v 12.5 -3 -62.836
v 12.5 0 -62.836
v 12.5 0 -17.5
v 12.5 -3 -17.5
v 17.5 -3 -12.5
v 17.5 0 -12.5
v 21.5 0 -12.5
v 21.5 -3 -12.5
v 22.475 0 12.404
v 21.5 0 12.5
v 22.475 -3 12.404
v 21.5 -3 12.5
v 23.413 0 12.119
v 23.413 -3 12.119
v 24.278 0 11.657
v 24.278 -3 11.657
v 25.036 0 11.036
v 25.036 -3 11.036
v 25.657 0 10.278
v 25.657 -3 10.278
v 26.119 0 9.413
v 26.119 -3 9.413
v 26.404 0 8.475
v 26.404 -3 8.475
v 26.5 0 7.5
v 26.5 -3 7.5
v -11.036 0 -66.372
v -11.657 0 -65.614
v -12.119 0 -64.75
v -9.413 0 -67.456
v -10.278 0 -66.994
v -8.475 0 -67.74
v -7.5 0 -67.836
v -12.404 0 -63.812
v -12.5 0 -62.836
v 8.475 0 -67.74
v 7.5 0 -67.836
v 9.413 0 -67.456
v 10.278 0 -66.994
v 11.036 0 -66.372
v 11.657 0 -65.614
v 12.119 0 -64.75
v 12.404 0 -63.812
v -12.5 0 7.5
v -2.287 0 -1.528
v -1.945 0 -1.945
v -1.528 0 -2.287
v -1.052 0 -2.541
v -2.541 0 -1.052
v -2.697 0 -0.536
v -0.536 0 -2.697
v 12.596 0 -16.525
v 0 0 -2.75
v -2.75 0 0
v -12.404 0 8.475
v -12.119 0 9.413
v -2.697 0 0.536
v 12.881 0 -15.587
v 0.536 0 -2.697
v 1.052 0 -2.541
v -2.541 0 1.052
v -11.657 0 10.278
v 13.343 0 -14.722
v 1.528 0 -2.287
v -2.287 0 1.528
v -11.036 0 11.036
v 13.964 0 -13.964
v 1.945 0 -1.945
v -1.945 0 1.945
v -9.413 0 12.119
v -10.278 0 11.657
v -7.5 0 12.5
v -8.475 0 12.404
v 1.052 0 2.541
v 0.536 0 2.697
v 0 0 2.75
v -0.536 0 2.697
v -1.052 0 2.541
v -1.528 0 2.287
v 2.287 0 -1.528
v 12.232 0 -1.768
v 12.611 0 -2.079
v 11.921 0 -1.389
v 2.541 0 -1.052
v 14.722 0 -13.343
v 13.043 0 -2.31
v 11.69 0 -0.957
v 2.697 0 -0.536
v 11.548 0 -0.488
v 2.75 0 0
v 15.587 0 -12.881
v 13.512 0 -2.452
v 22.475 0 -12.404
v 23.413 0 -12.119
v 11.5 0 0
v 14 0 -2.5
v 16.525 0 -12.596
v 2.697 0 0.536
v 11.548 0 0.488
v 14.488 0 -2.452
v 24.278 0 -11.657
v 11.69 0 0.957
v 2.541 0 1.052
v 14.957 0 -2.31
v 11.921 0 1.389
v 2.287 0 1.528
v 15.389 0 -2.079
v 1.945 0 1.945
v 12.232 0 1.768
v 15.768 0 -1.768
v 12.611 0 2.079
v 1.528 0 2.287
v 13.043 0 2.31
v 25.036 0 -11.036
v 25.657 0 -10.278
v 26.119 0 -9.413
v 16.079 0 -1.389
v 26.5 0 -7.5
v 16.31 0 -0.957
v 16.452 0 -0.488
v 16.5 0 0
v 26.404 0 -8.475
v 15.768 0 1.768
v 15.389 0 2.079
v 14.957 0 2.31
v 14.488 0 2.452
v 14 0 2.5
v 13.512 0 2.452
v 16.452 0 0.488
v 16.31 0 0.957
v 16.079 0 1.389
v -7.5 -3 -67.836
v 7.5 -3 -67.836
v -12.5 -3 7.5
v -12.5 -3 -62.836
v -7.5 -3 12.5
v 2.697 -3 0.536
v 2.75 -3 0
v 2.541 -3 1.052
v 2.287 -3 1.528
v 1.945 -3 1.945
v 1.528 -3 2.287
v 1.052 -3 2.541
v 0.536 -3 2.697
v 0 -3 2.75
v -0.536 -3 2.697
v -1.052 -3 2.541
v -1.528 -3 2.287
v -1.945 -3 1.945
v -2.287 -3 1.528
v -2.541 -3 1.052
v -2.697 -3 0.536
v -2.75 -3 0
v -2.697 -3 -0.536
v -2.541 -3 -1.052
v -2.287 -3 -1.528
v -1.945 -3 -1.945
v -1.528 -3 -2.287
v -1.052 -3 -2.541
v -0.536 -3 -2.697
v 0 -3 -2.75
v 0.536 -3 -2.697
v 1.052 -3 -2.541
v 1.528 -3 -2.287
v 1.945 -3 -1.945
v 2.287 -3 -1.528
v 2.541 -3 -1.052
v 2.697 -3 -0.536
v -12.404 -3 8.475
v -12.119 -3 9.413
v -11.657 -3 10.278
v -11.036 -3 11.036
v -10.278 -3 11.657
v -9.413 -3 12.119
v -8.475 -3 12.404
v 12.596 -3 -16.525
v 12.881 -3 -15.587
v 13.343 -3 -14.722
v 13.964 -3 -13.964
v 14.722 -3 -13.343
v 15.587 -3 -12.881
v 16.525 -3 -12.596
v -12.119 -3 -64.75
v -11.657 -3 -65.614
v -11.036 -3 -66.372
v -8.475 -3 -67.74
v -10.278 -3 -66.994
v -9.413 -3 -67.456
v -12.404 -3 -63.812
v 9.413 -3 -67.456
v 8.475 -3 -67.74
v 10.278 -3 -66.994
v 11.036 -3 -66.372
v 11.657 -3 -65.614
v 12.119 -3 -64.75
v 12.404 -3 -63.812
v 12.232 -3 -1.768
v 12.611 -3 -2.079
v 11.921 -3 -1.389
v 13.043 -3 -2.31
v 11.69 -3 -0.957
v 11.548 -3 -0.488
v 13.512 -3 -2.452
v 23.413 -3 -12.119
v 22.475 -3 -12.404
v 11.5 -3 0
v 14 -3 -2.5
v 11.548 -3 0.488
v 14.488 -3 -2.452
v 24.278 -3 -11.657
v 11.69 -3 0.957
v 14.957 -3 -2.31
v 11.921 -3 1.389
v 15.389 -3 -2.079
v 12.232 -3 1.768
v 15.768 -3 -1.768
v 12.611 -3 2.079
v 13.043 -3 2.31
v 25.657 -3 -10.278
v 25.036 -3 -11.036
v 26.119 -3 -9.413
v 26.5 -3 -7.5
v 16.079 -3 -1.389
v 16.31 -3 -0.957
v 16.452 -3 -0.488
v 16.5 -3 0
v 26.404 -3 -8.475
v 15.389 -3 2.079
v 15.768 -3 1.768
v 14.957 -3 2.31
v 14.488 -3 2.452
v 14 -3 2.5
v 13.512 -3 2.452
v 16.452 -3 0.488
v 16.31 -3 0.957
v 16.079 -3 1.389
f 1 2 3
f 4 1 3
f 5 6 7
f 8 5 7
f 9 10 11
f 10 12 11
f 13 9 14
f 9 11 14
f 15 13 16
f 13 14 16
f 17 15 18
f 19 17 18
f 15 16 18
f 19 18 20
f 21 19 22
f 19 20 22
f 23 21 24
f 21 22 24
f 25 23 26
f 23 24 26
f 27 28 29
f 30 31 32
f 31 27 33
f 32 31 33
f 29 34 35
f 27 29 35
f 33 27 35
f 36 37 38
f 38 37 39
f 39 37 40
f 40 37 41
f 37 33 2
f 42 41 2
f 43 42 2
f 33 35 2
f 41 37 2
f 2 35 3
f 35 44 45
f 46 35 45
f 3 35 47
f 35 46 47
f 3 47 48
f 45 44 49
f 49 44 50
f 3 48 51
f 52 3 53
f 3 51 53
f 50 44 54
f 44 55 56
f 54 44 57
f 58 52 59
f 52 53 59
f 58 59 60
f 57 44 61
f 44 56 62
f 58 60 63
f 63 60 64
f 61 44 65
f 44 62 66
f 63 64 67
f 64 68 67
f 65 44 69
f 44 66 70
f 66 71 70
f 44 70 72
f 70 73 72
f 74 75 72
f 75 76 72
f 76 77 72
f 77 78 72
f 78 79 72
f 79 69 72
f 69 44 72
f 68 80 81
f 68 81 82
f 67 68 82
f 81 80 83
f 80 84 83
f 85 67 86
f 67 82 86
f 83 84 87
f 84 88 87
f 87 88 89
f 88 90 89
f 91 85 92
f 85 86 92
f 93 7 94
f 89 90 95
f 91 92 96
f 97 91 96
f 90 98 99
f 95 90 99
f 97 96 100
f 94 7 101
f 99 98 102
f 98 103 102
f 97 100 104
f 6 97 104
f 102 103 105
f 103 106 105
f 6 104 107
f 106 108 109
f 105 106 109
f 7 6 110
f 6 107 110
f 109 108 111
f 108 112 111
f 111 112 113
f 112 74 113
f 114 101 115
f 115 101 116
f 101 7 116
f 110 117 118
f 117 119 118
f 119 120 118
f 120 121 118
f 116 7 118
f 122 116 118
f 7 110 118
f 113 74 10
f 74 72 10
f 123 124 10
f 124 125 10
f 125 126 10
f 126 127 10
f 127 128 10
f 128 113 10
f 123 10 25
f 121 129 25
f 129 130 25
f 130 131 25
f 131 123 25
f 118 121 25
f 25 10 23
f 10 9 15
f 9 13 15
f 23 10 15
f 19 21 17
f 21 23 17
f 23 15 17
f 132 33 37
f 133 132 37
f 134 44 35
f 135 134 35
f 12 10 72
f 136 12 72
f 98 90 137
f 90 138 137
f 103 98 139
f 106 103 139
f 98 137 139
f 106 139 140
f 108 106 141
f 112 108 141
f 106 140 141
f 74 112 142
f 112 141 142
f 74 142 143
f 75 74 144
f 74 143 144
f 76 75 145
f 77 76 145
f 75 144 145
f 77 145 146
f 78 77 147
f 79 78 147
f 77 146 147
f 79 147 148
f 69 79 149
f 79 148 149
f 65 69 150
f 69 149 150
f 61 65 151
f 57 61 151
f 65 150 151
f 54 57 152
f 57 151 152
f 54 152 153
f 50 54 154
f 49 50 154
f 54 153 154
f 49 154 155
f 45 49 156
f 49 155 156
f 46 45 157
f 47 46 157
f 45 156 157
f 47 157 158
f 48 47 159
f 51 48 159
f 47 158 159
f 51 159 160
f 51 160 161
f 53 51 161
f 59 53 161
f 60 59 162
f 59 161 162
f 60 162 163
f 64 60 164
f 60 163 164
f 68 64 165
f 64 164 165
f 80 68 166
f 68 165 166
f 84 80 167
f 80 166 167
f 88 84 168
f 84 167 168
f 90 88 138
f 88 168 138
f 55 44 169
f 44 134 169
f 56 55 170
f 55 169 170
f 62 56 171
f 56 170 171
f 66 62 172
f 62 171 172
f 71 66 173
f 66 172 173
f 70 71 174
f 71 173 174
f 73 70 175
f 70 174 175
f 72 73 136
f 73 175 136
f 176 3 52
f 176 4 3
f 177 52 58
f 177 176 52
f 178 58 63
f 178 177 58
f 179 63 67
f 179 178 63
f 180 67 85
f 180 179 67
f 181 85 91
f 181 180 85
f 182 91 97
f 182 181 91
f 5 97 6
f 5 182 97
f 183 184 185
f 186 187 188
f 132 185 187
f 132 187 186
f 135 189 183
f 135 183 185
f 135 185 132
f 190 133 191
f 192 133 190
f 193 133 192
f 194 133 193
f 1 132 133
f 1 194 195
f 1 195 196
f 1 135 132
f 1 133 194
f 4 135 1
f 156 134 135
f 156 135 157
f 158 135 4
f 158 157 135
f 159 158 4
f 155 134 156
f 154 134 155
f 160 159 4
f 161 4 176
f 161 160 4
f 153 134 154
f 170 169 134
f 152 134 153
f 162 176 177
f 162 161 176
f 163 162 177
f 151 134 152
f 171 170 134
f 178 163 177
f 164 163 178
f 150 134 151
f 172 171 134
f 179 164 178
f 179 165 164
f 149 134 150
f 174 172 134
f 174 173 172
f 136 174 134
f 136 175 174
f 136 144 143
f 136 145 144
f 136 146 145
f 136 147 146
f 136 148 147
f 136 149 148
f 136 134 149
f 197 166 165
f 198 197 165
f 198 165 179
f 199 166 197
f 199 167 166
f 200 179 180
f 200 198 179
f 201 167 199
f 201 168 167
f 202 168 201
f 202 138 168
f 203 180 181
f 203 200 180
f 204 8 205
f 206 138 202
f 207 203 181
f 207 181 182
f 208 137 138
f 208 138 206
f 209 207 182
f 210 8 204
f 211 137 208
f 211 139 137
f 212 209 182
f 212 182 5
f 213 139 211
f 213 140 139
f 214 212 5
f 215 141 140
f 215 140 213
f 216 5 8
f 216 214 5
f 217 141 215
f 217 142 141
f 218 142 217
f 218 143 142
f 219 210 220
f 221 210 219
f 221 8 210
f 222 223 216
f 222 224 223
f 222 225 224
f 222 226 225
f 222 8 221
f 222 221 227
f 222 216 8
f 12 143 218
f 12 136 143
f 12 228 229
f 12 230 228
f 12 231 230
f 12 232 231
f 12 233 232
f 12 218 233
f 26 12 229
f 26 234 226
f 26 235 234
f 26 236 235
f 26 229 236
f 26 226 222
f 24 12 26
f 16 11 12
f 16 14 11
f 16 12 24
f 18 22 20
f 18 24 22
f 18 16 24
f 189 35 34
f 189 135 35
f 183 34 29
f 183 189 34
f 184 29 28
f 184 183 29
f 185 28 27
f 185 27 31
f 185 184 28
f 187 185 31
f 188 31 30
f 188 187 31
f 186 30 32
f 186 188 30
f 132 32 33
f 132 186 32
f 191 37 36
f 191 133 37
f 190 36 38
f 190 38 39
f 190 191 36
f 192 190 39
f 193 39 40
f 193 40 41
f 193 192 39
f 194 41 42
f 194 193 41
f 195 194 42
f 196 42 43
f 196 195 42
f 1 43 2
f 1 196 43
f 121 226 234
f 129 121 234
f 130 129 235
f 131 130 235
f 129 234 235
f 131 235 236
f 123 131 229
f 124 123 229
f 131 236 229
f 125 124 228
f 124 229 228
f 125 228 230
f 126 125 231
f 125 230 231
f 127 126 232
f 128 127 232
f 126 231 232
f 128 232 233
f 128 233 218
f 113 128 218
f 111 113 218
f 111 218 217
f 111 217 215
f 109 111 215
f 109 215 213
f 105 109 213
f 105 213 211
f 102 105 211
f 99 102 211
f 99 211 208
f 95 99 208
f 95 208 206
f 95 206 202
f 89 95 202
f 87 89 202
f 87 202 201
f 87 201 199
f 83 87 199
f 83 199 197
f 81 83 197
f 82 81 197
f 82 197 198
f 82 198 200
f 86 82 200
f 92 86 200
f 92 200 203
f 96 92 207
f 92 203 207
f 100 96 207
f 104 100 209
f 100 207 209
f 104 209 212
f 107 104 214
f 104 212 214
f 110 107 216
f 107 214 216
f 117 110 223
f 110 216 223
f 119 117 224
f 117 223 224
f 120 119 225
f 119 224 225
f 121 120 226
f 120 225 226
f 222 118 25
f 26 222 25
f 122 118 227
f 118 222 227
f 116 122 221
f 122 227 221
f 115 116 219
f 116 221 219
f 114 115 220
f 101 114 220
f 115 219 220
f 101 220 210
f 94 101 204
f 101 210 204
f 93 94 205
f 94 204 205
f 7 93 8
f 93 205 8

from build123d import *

# Parameters (mm, degrees)
F0_R     = 1.5
F1_DEPTH = 3
F3_R     = 2.75
F4_DEPTH = 381
F6_R     = 5
F7_R     = 2.5
F8_DEPTH = 25


with BuildPart() as f1:
    # F0 (on Front) → F1 (new body)
    with BuildSketch(Plane.XZ):
        with BuildLine():
            Line((12.5, -12.5), (12.5, 0))
            ThreePointArc((12.5, 0), (12.4899799325, -0.5004011242), (12.4599357944, -1))
            ThreePointArc((12.4599357944, -1), (0, -12.5), (-12.4599357944, -1))
            ThreePointArc((-12.4599357944, -1), (-12.4899799325, -0.5004011242), (-12.5, 0))
            Line((-12.5, 0), (-12.5, -67.8362422814))
            Line((-12.5, -67.8362422814), (12.5, -67.8362422814))
            Line((12.5, -67.8362422814), (12.5, -59.3175111059))
            Line((12.5, -59.3175111059), (12.5, -12.5))
        make_face()
        Polygon((12.5, 12.5), (12.5, 0), (12.5, -12.5), (26.5, -12.5), (26.5, 12.5), align=None)
        with BuildLine():
            ThreePointArc((12.4599357944, 1), (12.4899799325, 0.5004011242), (12.5, 0))
            Line((12.5, 0), (12.5, 12.5))
            Line((12.5, 12.5), (0, 12.5))
            ThreePointArc((0, 12.5), (8.4779124789, 9.1855865354), (12.4599357944, 1))
        make_face()
        with BuildLine():
            Line((12.4599357944, -1), (12.4599357944, 1))
            ThreePointArc((12.4599357944, 1), (8.4779124789, 9.1855865354), (0, 12.5))
            ThreePointArc((0, 12.5), (-8.4779124789, 9.1855865354), (-12.4599357944, 1))
            Line((-12.4599357944, 1), (-12.4599357944, -1))
            ThreePointArc((-12.4599357944, -1), (0, -12.5), (12.4599357944, -1))
        make_face()
        Circle(F0_R, mode=Mode.SUBTRACT)
        with BuildLine():
            ThreePointArc((-12.4599357944, 1), (-8.4779124789, 9.1855865354), (0, 12.5))
            Line((0, 12.5), (-12.5, 12.5))
            Line((-12.5, 12.5), (-12.5, 0))
            ThreePointArc((-12.5, 0), (-12.4899799325, 0.5004011242), (-12.4599357944, 1))
        make_face()
        with BuildLine():
            ThreePointArc((-12.5, 0), (-12.4899799325, -0.5004011242), (-12.4599357944, -1))
            Line((-12.4599357944, -1), (-12.4599357944, 1))
            ThreePointArc((-12.4599357944, 1), (-12.4899799325, 0.5004011242), (-12.5, 0))
        make_face()
        Circle(F0_R)
    extrude(amount=F1_DEPTH)

    # F3 (on face) → F4 (cut, symmetric)
    with BuildSketch(Plane.XZ.offset(3)):
        Circle(F3_R)
    extrude(amount=F4_DEPTH, both=True, mode=Mode.SUBTRACT)

    # F6
    f6_edges = [f1.edges().sort_by_distance(p)[0] for p in [
        (12.5, -1.5, -67.836242),
        (-12.5, -1.5, -67.836242),
        (-12.5, -1.5, 12.5),
        (12.5, -1.5, -12.5),
        (26.5, -1.5, -12.5),
        (26.5, -1.5, 12.5),
    ]]
    fillet(f6_edges, radius=F6_R)

    # F7 (on face) → F8 (cut)
    with BuildSketch(Plane.XZ.offset(3)):
        with Locations((14, 0)):
            Circle(F7_R)
        with BuildLine():
            Line((12.4599357944, -1), (12.4599357944, 1))
            ThreePointArc((12.4599357944, 1), (12.5, 0), (12.4599357944, -1))
        make_face(mode=Mode.SUBTRACT)
    extrude(amount=-F8_DEPTH, mode=Mode.SUBTRACT)


solid = f1.part
